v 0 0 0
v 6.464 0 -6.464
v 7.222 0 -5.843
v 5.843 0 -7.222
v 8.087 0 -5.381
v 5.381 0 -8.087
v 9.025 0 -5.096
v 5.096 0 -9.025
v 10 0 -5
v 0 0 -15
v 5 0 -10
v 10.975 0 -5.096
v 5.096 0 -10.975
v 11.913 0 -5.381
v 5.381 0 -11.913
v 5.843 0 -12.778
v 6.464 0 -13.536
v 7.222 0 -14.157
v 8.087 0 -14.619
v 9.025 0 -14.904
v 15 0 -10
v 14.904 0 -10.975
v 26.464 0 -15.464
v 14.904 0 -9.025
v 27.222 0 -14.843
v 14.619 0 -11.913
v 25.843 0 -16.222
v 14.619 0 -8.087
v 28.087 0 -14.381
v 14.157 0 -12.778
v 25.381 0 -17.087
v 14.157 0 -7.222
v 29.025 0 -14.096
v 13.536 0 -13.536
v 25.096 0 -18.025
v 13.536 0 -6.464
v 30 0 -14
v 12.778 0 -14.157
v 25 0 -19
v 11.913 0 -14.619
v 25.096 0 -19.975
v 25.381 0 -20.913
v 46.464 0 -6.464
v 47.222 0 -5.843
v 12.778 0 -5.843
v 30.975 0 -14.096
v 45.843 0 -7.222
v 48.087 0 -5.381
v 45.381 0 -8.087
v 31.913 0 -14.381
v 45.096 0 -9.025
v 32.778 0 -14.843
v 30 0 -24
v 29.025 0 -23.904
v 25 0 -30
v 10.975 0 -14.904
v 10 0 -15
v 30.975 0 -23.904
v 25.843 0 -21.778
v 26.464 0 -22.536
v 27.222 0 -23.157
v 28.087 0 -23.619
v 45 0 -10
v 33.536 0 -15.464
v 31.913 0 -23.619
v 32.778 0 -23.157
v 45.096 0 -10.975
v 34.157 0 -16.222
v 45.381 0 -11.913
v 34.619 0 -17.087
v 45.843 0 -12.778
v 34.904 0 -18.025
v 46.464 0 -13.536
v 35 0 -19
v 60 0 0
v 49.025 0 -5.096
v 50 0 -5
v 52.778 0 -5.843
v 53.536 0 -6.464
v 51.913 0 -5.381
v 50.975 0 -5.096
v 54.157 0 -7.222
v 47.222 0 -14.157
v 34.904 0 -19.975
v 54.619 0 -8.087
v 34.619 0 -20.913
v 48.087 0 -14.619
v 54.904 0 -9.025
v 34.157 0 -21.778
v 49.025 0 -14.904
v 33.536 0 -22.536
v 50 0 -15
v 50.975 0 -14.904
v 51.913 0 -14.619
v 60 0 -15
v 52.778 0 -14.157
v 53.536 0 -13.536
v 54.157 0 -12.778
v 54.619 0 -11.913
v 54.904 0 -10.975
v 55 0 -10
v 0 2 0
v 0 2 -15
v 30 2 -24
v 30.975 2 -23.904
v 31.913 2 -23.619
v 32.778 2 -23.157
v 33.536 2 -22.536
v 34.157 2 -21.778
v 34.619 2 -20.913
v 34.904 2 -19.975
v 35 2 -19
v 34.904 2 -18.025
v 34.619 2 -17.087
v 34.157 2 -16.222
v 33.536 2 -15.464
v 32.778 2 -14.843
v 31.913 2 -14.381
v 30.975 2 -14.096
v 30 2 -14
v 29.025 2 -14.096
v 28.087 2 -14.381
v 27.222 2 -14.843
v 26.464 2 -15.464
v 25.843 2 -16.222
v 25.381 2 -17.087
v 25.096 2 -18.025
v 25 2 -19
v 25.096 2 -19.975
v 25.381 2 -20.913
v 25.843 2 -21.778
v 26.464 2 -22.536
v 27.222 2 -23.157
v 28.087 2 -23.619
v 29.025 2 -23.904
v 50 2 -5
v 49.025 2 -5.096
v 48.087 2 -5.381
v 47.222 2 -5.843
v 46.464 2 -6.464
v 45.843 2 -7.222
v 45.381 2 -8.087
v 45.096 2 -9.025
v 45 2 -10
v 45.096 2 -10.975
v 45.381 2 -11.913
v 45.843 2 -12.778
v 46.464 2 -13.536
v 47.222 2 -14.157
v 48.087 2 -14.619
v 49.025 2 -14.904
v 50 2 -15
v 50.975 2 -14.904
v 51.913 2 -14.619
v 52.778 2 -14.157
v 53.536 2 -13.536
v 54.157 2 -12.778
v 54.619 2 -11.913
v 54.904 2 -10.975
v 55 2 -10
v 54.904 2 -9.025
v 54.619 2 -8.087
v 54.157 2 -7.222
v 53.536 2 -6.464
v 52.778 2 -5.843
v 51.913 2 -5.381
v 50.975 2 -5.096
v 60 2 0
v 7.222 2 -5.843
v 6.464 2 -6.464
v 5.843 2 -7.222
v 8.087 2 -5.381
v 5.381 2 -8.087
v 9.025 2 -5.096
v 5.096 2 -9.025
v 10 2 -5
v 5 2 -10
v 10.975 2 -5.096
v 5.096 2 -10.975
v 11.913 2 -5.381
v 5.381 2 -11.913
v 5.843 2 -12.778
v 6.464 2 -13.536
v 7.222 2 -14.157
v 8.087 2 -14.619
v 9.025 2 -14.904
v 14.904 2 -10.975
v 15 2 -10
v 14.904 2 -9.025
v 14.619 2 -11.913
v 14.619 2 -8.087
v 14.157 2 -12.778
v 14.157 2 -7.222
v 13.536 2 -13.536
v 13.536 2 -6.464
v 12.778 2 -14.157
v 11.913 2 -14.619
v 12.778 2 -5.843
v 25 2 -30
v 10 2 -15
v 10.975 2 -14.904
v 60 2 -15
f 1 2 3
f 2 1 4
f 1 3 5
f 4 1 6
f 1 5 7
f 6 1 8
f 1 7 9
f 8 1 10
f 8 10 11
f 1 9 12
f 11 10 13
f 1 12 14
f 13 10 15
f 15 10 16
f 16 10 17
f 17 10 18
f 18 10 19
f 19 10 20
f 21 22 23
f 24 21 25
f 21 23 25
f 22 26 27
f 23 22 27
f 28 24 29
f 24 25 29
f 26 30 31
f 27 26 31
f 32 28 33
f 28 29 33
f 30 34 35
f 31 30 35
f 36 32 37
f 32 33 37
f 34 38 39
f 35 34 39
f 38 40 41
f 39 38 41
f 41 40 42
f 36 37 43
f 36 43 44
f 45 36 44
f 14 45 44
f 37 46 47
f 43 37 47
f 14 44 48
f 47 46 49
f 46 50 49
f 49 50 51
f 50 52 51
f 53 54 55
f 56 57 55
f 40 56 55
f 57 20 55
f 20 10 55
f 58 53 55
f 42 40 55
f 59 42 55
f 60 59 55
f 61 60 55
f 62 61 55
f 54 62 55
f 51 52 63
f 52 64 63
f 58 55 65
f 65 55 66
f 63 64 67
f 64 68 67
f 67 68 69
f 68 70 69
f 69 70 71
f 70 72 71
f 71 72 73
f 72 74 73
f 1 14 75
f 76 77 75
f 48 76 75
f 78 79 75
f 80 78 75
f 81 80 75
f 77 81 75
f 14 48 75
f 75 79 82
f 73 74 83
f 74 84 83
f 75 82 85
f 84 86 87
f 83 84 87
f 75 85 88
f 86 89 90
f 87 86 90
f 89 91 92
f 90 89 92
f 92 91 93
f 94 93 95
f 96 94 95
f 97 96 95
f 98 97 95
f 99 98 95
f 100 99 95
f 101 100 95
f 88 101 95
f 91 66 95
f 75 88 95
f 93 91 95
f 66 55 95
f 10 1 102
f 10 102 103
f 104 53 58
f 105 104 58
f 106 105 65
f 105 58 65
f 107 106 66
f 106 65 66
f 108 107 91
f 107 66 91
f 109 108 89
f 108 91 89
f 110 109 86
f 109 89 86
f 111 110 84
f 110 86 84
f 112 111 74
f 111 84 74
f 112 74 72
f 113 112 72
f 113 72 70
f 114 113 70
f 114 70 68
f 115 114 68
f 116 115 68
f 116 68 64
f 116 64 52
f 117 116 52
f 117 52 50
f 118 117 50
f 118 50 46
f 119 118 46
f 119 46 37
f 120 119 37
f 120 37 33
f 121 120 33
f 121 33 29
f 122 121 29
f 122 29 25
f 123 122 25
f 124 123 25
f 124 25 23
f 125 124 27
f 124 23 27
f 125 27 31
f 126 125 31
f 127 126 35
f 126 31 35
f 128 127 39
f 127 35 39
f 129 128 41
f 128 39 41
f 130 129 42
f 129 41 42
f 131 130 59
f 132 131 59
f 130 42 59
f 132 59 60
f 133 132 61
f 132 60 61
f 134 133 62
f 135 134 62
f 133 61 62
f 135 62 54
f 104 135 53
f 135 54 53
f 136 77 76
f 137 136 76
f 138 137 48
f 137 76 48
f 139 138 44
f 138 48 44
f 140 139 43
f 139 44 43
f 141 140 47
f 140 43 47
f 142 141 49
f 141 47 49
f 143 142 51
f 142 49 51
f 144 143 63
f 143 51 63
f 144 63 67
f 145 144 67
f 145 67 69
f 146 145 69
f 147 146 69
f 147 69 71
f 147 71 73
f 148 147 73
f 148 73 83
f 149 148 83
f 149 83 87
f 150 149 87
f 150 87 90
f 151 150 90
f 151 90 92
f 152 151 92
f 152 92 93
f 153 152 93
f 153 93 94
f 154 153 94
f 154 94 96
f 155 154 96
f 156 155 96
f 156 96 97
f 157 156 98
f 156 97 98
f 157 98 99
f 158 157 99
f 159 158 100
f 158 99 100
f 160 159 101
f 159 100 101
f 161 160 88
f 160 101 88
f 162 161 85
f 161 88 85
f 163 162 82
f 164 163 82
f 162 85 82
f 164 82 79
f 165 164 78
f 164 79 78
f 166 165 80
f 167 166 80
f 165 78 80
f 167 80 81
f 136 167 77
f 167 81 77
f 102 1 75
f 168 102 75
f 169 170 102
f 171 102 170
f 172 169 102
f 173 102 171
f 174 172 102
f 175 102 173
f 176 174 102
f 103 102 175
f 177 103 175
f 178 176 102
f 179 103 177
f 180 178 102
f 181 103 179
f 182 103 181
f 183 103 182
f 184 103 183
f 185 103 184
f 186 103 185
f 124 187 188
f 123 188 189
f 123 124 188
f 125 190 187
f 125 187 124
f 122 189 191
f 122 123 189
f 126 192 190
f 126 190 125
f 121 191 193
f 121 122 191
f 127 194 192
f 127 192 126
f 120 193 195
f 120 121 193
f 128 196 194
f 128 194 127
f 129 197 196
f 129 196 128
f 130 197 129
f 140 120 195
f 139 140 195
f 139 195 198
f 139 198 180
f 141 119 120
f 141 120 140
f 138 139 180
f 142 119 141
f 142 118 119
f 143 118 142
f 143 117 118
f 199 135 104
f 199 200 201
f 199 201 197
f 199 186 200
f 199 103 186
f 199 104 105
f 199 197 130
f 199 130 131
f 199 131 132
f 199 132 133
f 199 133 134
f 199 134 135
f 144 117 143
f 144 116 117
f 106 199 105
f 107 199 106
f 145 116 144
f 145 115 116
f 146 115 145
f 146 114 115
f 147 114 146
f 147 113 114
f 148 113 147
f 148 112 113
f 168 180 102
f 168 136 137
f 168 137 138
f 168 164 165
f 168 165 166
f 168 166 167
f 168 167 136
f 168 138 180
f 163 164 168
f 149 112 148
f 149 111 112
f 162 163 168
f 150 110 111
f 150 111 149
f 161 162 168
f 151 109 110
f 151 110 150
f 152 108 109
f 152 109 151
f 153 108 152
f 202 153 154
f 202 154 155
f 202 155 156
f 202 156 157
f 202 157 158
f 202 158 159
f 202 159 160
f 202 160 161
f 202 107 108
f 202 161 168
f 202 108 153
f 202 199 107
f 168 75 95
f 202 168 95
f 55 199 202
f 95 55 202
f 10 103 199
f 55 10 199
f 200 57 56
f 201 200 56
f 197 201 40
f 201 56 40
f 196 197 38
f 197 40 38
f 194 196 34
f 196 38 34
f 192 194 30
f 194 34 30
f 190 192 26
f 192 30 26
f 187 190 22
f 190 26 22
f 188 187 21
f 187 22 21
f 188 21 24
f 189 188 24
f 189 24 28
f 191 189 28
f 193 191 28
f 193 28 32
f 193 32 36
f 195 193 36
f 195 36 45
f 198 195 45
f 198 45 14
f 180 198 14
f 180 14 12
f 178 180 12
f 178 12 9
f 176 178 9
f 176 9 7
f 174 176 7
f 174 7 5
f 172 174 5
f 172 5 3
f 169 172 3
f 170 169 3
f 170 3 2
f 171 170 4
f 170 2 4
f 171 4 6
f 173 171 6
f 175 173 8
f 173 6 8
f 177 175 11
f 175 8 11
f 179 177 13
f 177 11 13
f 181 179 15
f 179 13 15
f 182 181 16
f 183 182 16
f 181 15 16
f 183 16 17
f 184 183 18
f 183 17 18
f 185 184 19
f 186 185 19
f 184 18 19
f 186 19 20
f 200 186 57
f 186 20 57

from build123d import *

# Parameters (mm, degrees)
SKETCH1_W           = 60
SKETCH1_H           = 30
BOSS_EXTRUDE1_DEPTH = 2
CUT_EXTRUDE1_DEPTH  = 68.111846942
SKETCH3_R           = 5
CUT_EXTRUDE2_DEPTH  = 68.111846942


with BuildPart() as part:
    # Sketch1 → Boss-Extrude1 (new body)
    with BuildSketch(Plane(origin=(0, 0, 0), x_dir=(1, 0, 0), z_dir=(0, 1, 0))):
        with Locations((30, 15)):
            Rectangle(SKETCH1_W, SKETCH1_H)
    extrude(amount=BOSS_EXTRUDE1_DEPTH)

    # Sketch2 → Cut-Extrude1 (cut, through all)
    with BuildSketch(Plane(origin=(0, 2, 0), x_dir=(1, 0, 0), z_dir=(0, 1, 0))):
        Polygon((60, 15), (60, 30), (25, 30), align=None)
        Polygon((0, 15), (25, 30), (0, 30), align=None)
    extrude(amount=-CUT_EXTRUDE1_DEPTH, mode=Mode.SUBTRACT)

    # Sketch3 → Cut-Extrude2 (cut, through all)
    with BuildSketch(Plane.XZ):
        with Locations(Location((10, -10, 0), (0, 0, 270))):
            Circle(SKETCH3_R)
        with Locations(Location((50, -10, 0), (0, 0, 90))):
            Circle(SKETCH3_R)
        with Locations(Location((30, -19, 0), (0, 0, 270))):
            Circle(SKETCH3_R)
    extrude(amount=-CUT_EXTRUDE2_DEPTH, mode=Mode.SUBTRACT)


solid = part.part
